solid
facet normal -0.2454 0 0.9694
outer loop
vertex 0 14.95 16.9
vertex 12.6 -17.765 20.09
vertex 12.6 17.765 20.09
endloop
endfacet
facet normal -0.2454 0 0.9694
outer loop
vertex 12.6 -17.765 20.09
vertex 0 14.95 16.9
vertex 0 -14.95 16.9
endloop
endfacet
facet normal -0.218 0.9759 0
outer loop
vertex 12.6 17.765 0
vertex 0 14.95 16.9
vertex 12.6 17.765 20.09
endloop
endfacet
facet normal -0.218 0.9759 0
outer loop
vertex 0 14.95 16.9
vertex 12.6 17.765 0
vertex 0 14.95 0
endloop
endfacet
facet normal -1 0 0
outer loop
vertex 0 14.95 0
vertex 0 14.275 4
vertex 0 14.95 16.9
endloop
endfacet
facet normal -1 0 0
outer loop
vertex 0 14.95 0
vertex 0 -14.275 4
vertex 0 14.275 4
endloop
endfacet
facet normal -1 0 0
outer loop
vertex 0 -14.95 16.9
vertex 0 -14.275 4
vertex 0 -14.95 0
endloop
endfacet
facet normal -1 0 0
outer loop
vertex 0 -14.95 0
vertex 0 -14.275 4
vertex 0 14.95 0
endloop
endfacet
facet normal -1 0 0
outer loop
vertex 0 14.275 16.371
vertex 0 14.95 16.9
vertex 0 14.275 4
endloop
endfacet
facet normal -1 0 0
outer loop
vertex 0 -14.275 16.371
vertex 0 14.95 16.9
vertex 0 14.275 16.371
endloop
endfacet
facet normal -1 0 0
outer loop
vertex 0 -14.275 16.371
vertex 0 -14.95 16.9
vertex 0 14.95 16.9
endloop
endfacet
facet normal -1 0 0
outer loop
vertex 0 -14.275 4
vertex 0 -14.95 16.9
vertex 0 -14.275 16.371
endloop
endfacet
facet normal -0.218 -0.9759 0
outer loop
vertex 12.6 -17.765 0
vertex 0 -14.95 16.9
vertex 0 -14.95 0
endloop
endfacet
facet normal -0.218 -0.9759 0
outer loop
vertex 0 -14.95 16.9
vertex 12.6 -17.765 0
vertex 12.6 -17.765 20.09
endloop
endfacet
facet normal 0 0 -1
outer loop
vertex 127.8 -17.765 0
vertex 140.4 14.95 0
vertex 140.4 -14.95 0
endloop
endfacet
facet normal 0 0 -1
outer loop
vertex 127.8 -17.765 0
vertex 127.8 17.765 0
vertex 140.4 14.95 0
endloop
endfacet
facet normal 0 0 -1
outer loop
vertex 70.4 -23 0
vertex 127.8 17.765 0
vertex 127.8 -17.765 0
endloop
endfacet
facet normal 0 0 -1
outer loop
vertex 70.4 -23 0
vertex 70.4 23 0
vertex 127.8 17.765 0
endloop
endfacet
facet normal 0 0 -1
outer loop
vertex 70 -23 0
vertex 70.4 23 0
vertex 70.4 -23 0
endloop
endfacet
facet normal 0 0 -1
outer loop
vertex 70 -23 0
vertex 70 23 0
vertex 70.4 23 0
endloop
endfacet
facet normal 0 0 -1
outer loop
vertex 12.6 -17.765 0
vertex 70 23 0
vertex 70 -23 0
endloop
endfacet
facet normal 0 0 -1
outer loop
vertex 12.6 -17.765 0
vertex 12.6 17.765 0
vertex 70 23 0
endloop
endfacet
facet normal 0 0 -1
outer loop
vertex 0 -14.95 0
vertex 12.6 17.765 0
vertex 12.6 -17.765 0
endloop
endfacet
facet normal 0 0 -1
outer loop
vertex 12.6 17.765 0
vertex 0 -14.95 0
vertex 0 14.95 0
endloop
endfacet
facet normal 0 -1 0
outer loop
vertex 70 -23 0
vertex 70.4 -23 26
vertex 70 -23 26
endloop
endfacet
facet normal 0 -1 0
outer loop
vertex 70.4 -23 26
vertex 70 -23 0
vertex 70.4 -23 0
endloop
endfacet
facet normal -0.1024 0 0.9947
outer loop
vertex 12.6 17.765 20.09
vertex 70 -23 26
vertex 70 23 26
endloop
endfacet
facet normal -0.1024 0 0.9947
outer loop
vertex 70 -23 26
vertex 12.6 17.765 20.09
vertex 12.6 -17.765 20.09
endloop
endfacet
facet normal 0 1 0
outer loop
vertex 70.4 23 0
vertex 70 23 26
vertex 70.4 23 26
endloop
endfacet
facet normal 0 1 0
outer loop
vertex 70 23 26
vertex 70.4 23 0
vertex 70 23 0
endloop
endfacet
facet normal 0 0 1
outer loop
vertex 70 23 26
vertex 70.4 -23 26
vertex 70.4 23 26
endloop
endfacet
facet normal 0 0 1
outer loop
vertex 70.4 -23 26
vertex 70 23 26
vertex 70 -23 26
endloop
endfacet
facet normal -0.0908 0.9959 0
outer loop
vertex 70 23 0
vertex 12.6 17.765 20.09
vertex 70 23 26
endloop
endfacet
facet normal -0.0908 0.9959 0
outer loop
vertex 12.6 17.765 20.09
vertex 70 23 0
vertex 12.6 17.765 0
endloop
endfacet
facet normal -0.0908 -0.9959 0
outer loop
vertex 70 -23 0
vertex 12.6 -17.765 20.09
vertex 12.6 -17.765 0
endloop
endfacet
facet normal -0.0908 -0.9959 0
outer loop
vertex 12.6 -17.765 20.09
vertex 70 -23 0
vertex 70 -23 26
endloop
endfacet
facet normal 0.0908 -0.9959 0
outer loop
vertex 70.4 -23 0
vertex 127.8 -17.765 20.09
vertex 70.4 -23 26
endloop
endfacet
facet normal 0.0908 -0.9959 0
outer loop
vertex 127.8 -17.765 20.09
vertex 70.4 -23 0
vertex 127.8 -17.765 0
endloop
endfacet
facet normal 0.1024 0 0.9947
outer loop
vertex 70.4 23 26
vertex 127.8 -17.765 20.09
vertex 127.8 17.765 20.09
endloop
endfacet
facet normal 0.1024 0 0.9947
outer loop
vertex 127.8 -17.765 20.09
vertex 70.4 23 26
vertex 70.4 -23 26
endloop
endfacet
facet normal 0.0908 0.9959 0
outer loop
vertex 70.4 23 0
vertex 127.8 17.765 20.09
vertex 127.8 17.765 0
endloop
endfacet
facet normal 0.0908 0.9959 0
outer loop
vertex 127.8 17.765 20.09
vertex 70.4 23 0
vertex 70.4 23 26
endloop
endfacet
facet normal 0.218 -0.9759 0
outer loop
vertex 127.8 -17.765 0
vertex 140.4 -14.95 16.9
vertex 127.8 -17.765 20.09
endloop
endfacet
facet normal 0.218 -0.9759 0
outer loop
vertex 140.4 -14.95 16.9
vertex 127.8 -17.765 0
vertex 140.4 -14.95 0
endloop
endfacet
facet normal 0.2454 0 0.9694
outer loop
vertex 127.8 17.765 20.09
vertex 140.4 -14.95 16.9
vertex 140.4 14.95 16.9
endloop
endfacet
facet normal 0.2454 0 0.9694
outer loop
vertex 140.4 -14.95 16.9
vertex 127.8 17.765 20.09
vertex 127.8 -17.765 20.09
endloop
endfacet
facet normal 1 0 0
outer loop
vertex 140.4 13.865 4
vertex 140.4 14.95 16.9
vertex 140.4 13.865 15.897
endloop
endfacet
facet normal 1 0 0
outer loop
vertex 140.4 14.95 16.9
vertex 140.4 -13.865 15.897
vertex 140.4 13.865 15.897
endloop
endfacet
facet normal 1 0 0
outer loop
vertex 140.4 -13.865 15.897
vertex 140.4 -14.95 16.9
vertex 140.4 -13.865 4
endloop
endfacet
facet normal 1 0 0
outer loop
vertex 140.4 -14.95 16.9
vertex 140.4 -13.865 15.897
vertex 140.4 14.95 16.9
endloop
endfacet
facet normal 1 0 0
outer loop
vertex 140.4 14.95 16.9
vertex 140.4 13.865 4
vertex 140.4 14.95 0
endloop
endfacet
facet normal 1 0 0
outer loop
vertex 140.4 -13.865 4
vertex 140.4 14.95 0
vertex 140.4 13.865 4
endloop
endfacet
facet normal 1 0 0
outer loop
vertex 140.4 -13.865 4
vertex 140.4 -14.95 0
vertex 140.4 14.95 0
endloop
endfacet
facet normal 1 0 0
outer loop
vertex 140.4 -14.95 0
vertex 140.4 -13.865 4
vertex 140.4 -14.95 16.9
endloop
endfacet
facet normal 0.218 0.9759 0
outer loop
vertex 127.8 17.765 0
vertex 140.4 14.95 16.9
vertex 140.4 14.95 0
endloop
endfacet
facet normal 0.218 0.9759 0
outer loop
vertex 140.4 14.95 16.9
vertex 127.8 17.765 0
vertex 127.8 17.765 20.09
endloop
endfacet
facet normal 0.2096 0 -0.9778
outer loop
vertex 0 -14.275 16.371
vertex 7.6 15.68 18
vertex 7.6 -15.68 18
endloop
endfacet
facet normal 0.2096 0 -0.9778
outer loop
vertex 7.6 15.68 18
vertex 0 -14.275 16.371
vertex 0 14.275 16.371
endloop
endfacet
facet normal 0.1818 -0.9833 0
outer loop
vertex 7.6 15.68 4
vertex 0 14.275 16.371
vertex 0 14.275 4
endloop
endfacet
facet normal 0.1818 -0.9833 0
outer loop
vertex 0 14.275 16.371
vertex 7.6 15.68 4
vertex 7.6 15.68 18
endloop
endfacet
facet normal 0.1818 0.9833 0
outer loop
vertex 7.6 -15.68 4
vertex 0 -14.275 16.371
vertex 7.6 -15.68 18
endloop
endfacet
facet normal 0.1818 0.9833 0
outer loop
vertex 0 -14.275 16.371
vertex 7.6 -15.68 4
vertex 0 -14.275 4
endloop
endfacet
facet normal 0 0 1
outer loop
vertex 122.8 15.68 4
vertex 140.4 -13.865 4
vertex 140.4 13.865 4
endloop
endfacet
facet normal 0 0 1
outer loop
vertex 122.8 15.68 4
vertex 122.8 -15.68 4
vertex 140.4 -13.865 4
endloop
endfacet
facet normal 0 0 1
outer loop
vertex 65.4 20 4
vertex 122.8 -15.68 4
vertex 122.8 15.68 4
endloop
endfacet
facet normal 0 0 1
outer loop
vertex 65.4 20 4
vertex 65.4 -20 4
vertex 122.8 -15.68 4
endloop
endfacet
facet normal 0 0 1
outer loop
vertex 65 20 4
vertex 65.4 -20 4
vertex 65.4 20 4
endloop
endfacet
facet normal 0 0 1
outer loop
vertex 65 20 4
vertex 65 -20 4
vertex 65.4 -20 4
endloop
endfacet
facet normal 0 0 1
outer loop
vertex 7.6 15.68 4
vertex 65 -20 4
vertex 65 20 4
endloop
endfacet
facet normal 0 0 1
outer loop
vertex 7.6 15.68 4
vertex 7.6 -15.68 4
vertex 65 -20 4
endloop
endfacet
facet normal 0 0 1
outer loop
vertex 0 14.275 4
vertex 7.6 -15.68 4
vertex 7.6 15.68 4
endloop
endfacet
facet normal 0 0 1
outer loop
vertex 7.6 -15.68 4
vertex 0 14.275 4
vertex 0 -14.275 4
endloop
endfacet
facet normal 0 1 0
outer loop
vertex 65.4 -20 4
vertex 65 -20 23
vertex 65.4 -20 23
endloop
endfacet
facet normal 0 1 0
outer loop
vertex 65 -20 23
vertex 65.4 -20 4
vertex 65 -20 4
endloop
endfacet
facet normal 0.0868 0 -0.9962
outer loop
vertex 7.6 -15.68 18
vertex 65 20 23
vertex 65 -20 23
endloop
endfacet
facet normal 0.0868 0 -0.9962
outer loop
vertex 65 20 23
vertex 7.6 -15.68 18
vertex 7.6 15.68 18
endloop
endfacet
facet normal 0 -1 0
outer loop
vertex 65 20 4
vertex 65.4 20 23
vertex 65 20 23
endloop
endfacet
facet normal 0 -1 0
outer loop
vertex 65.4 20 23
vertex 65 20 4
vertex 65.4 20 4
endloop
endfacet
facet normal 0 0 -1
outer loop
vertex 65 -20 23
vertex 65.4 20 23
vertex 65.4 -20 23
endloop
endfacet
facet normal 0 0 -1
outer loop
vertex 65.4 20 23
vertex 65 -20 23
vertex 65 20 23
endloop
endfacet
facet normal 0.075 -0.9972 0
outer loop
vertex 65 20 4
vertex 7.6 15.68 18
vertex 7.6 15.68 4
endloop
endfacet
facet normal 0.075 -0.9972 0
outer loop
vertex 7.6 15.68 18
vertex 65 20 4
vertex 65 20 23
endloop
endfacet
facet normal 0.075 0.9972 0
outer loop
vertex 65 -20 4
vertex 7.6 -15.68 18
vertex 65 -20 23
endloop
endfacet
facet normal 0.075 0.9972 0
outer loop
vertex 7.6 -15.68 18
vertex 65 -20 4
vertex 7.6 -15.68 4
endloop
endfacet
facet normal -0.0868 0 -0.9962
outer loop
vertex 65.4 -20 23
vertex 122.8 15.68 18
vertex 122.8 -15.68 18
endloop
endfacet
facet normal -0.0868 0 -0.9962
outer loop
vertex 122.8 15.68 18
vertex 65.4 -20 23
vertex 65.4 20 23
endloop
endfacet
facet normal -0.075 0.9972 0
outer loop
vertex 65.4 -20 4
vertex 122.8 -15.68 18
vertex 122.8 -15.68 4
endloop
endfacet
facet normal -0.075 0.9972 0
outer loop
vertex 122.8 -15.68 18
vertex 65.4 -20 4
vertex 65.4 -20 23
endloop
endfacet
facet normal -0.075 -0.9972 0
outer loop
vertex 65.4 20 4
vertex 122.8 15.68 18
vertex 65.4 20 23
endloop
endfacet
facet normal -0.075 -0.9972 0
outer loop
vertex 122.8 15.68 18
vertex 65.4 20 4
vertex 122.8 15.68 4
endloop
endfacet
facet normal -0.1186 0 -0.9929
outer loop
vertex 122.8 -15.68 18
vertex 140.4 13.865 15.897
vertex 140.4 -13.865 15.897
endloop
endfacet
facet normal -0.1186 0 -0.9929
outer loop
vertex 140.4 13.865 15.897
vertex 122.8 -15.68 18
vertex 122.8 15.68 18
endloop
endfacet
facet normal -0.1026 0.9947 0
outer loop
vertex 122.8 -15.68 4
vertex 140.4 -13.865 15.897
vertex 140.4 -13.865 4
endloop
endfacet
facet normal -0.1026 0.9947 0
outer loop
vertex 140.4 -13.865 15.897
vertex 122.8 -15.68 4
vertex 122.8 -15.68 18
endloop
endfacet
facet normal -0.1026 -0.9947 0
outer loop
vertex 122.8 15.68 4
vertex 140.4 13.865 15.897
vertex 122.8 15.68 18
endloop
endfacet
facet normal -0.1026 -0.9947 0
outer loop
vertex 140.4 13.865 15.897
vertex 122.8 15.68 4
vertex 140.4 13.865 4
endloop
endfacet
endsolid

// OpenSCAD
$fn = 32;

// ----------------------------------------------------------------------
// Faired channel: 140 x 46 x 26 mm, 3 mm walls, faired ends
// ----------------------------------------------------------------------

// --- parameters (mm) ---
length = 140;             // channel length
width = 46;               // channel width at mid length
height = 26;              // channel height at mid length
wall = 3;                 // side wall thickness
floor_t = 4;              // floor thickness
end_w = 29.9;             // faired end width
end_h = 16.9;             // faired end height

difference() {
  union() {
    hull() {
      translate([0, -14.95, 0]) cube([0.4, 29.9, 16.9]);
      translate([12.6, -17.765, 0]) cube([0.4, 35.53, 20.09]);
    }
    hull() {
      translate([12.6, -17.765, 0]) cube([0.4, 35.53, 20.09]);
      translate([70, -23, 0]) cube([0.4, 46, 26]);
    }
    hull() {
      translate([70, -23, 0]) cube([0.4, 46, 26]);
      translate([127.4, -17.765, 0]) cube([0.4, 35.53, 20.09]);
    }
    hull() {
      translate([127.4, -17.765, 0]) cube([0.4, 35.53, 20.09]);
      translate([140, -14.95, 0]) cube([0.4, 29.9, 16.9]);
    }
  }
  /* cavity, 5 mm proud of both ends so the ports are cut clean */
  hull() {
    translate([-5, -13.35, 4]) cube([0.4, 26.7, 11.3]);
    translate([7.6, -15.68, 4]) cube([0.4, 31.36, 14]);
  }
  hull() {
    translate([7.6, -15.68, 4]) cube([0.4, 31.36, 14]);
    translate([65, -20, 4]) cube([0.4, 40, 19]);
  }
  hull() {
    translate([65, -20, 4]) cube([0.4, 40, 19]);
    translate([122.4, -15.68, 4]) cube([0.4, 31.36, 14]);
  }
  hull() {
    translate([122.4, -15.68, 4]) cube([0.4, 31.36, 14]);
    translate([145, -13.35, 4]) cube([0.4, 26.7, 11.3]);
  }
}
